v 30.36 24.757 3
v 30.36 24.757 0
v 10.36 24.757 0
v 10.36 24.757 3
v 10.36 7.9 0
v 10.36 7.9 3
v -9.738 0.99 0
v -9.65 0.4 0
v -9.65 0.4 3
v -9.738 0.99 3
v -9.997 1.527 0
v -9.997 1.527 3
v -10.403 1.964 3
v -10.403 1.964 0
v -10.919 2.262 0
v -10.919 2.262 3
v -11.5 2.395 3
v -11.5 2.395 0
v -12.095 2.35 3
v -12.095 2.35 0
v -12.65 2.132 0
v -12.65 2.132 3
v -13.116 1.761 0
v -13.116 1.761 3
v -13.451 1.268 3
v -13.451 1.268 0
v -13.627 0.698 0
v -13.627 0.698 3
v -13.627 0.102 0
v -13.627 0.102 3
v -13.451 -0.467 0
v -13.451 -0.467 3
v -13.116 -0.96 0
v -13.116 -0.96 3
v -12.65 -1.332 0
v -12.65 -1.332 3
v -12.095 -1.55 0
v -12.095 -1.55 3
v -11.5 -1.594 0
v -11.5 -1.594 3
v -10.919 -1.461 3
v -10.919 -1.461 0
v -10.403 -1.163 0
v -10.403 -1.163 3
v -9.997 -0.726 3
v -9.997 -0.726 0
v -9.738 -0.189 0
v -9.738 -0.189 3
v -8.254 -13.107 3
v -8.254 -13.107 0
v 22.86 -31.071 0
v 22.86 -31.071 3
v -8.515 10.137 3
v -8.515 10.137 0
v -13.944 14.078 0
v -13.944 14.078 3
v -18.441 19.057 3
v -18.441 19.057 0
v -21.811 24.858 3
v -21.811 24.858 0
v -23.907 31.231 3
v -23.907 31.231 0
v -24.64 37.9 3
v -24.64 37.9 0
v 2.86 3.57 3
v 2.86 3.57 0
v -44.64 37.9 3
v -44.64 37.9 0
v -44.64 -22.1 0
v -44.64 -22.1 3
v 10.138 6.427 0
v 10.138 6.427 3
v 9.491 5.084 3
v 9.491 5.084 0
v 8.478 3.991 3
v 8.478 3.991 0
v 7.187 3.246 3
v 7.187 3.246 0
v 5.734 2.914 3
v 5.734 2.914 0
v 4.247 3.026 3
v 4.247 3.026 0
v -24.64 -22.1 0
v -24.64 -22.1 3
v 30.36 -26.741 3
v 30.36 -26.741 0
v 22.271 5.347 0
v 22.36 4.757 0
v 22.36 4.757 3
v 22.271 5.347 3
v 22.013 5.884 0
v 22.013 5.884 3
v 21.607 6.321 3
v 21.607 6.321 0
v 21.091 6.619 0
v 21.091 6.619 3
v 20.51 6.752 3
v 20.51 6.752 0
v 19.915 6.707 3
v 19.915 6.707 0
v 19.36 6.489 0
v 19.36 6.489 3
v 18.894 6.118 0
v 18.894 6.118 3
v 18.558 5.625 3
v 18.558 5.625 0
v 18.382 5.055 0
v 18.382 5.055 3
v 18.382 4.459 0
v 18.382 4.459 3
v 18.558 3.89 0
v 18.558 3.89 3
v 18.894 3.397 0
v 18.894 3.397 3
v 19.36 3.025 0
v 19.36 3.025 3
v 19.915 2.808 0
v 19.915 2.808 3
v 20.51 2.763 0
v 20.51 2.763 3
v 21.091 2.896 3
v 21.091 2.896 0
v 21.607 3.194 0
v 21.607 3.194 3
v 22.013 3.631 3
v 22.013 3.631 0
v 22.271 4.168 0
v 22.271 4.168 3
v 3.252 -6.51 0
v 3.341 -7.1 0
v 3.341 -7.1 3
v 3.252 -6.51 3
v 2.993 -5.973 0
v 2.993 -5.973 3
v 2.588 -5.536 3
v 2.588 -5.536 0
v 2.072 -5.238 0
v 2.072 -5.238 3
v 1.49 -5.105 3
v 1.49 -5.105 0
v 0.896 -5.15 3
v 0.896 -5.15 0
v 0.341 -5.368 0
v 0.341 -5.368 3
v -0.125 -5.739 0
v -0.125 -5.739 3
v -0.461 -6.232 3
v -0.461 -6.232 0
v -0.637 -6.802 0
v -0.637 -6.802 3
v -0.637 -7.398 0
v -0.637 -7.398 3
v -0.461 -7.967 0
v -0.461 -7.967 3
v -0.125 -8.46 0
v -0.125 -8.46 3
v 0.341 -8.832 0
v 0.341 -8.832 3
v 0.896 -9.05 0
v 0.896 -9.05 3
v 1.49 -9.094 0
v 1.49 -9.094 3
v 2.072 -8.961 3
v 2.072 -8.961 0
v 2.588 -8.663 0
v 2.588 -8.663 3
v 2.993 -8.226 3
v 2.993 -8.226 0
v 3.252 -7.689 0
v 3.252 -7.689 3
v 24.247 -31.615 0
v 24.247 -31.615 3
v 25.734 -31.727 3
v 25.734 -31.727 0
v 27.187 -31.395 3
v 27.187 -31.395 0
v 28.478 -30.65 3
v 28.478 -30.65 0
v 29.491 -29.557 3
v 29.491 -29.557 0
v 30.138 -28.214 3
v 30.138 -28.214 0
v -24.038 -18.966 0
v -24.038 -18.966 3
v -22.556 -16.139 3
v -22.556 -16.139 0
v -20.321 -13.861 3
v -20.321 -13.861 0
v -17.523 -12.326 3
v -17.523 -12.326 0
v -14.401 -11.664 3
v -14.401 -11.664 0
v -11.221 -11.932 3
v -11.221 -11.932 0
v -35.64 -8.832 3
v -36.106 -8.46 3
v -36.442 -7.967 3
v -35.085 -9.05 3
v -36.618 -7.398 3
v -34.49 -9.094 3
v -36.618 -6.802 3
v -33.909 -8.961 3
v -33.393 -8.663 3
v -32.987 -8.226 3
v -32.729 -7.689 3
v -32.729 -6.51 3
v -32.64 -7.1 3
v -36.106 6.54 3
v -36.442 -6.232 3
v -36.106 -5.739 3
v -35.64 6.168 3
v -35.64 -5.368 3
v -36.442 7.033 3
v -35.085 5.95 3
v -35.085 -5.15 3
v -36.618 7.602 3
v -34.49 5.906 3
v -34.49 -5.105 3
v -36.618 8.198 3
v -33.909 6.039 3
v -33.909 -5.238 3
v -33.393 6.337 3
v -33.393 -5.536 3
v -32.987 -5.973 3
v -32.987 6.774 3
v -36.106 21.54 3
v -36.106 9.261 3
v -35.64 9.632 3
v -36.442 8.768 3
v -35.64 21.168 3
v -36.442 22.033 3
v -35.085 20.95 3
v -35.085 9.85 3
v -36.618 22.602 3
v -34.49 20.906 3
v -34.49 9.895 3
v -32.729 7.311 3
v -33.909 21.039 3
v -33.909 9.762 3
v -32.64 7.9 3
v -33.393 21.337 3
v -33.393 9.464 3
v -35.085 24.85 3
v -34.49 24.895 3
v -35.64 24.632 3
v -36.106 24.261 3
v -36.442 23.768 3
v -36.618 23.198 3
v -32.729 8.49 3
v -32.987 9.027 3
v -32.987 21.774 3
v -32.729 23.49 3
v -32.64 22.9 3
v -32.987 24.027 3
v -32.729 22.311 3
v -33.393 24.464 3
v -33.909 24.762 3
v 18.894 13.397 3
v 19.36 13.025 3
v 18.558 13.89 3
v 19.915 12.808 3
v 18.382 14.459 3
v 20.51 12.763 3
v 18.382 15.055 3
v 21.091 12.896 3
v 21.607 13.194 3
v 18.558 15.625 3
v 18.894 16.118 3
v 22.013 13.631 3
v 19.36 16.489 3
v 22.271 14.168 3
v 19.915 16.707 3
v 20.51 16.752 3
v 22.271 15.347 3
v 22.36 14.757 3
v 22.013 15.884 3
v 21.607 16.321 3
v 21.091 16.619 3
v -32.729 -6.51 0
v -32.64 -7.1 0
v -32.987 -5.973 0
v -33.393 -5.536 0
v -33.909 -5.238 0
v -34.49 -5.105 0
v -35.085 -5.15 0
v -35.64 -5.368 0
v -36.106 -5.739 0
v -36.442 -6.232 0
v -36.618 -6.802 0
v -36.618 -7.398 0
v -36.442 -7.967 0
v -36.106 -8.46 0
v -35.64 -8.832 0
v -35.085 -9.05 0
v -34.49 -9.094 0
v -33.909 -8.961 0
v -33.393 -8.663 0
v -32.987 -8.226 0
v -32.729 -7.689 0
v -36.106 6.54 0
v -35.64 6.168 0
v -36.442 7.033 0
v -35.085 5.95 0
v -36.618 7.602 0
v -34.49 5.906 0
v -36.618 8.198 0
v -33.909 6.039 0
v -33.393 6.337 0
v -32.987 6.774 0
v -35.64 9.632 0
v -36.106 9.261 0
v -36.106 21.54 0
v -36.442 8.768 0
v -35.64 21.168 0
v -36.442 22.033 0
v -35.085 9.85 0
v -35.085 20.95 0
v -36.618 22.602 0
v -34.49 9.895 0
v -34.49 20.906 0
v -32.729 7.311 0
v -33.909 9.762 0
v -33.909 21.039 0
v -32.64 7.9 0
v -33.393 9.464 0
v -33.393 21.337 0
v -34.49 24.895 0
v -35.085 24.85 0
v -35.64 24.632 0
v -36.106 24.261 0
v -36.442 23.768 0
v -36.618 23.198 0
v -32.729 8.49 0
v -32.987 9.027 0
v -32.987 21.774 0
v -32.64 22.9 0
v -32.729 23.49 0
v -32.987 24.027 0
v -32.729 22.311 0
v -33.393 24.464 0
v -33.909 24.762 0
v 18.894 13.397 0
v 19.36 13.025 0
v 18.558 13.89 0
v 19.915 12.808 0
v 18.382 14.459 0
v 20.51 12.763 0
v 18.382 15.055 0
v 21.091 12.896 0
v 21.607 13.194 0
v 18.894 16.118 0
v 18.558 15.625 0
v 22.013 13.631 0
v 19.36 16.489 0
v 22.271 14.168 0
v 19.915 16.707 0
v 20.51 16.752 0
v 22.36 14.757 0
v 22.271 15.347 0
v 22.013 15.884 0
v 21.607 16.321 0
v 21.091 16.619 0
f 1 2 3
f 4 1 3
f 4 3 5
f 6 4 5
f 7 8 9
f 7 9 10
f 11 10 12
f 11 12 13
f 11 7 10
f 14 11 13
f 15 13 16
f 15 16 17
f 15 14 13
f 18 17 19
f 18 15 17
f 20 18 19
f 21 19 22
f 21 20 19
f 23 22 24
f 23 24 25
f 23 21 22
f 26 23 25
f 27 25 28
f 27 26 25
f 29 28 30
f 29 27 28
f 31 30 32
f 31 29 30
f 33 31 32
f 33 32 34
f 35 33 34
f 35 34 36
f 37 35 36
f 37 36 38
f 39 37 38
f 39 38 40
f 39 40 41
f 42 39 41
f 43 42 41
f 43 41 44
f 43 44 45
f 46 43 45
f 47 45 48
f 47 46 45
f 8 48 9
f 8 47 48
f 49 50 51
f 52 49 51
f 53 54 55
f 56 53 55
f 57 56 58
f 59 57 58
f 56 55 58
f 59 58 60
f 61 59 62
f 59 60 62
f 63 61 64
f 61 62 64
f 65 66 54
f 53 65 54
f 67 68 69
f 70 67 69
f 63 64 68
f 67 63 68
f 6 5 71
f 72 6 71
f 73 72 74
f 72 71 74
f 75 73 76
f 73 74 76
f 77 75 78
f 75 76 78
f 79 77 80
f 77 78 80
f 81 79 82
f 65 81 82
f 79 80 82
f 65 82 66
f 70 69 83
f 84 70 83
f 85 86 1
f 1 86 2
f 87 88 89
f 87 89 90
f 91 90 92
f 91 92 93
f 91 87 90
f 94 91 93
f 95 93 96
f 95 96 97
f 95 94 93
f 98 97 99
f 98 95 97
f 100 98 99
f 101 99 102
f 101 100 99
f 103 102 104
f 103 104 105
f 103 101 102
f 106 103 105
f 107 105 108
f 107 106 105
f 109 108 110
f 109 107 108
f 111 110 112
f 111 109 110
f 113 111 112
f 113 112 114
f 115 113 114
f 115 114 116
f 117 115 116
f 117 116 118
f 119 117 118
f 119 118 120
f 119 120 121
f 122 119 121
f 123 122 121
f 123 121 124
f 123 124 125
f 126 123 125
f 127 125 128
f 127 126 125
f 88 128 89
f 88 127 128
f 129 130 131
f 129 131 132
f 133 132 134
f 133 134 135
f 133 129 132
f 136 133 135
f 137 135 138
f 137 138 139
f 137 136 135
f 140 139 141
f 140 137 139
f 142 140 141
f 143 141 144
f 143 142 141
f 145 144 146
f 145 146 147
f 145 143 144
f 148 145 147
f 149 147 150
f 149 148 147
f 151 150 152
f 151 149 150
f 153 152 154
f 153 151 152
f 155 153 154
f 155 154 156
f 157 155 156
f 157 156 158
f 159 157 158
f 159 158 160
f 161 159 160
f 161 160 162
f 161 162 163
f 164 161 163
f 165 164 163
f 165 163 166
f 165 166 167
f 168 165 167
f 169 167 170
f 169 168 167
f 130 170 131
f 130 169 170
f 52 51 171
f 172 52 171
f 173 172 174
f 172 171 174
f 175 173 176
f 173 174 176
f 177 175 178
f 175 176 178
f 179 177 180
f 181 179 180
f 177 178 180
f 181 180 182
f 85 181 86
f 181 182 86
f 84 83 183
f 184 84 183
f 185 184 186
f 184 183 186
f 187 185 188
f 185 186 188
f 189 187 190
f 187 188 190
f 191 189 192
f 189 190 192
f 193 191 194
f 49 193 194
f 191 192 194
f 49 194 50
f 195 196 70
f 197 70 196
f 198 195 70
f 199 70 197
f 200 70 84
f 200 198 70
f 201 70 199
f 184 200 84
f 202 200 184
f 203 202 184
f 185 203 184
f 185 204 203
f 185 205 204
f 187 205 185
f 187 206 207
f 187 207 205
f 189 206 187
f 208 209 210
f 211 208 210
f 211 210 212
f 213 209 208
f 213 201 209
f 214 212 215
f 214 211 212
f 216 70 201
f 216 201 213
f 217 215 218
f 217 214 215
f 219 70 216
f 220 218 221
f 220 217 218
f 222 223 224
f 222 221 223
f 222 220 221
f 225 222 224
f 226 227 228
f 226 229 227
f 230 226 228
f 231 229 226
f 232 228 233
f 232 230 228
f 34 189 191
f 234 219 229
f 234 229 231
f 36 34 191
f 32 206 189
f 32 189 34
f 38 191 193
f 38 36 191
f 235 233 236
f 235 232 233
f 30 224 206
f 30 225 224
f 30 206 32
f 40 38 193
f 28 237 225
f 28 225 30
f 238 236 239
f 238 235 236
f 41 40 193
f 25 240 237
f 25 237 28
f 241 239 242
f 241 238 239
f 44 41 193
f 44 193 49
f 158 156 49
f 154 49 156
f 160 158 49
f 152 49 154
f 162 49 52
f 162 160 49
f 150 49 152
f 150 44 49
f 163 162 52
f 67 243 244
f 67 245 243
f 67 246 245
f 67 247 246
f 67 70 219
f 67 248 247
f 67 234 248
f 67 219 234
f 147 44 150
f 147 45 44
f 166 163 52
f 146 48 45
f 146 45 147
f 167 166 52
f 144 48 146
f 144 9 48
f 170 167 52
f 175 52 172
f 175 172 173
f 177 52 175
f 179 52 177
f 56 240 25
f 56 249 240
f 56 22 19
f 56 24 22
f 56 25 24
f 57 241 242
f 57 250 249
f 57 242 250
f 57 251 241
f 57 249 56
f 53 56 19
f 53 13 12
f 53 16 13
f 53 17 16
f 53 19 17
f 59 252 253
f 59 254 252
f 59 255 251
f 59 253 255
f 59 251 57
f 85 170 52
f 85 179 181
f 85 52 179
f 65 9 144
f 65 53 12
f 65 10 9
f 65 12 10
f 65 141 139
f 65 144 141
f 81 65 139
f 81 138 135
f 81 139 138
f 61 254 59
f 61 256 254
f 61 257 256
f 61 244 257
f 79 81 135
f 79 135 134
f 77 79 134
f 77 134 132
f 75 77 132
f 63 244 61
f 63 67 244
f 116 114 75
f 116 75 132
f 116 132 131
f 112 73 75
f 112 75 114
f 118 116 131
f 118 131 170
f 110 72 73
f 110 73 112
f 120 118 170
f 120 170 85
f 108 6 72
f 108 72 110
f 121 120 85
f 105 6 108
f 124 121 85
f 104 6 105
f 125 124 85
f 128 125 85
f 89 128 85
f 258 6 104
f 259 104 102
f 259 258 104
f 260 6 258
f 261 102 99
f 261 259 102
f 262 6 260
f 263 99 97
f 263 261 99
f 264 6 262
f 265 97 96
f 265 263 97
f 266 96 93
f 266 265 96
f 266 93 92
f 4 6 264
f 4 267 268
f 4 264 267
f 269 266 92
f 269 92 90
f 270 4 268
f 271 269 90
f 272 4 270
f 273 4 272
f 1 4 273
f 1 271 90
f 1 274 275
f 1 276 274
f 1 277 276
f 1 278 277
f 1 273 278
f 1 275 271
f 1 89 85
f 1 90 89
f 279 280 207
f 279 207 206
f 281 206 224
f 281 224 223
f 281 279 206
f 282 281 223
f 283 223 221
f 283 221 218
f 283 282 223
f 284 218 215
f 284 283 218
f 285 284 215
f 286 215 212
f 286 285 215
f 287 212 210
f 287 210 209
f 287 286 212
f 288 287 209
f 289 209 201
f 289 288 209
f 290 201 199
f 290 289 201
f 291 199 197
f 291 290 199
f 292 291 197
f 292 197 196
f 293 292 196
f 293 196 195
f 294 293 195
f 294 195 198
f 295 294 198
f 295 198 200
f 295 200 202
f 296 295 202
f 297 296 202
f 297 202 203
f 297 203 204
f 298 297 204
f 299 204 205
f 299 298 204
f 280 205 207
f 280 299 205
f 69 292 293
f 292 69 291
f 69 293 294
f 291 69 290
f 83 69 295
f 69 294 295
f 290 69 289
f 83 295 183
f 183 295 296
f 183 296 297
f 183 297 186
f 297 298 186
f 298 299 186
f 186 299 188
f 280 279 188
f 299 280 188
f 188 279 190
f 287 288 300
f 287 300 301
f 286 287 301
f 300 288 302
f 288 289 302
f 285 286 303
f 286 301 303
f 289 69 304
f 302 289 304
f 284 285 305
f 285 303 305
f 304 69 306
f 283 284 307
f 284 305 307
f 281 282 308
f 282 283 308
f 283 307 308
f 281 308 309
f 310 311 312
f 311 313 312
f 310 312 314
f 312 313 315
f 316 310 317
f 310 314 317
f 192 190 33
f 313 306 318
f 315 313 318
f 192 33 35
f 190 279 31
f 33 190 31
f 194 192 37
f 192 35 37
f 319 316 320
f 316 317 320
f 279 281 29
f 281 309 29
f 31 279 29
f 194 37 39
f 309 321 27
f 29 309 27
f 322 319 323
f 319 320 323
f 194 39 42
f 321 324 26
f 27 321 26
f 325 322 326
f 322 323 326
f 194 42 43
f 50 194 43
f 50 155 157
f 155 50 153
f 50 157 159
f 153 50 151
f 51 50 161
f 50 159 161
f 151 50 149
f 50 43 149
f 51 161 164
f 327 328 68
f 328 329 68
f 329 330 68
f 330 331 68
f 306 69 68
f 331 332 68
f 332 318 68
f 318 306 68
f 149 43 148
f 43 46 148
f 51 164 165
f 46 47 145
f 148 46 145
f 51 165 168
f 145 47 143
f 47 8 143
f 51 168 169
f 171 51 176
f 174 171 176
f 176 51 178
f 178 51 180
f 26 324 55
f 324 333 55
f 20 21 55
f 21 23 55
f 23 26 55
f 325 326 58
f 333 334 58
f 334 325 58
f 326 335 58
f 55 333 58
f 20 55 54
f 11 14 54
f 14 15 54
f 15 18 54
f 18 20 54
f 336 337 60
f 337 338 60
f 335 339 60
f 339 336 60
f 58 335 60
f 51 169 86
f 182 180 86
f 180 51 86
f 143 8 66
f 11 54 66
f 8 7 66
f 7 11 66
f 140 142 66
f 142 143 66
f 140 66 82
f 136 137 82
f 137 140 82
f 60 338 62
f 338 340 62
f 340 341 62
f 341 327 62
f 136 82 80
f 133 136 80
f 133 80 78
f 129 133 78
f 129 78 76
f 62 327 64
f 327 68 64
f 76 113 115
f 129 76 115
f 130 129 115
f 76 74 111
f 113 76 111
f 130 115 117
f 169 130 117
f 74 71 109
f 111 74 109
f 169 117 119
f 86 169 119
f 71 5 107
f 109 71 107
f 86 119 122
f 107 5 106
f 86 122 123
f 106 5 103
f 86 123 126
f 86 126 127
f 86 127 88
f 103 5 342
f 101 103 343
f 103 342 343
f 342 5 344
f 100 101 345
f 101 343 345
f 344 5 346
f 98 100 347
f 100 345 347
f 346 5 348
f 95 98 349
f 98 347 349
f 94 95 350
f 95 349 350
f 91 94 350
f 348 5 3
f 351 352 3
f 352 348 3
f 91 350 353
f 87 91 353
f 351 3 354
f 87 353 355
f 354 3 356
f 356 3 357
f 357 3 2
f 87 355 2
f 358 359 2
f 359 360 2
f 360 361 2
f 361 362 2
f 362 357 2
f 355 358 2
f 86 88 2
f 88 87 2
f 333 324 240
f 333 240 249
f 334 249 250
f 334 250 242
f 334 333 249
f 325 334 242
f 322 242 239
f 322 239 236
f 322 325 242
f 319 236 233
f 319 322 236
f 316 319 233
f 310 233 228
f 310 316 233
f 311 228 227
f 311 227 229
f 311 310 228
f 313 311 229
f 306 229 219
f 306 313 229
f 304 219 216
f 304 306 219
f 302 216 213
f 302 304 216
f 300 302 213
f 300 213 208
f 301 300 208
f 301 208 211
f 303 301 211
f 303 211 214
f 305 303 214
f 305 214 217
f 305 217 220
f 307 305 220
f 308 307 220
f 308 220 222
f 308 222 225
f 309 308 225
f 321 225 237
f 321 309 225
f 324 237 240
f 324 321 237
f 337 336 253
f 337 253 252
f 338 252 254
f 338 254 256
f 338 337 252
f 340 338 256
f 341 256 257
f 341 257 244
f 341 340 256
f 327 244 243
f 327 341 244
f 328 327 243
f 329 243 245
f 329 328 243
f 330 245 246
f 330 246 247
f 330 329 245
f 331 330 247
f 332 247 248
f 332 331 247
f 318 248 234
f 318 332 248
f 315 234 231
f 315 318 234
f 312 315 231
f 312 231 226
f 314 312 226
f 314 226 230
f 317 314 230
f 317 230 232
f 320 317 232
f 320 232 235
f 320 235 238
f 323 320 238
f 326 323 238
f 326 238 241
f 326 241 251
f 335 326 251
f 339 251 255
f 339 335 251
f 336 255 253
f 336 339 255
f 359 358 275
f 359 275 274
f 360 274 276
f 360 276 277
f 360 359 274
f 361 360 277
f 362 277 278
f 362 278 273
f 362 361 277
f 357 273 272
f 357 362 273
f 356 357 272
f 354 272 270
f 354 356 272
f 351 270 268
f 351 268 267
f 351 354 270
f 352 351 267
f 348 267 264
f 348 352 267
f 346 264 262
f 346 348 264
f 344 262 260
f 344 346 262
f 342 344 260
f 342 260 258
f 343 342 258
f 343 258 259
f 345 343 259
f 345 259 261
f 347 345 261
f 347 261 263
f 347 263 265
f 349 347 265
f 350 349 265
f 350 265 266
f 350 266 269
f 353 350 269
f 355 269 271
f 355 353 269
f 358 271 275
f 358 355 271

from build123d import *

# Parameters (mm, degrees)
SKETCH_1_R      = 2
EXTRUDE_1_DEPTH = 3


with BuildPart() as part:
    # 草图1 → 凸台-拉伸1 (new body)
    with BuildSketch(Plane.XY):
        with BuildLine():
            Line((-8.253871793, -13.107166096), (22.860072418, -31.070810161))
            ThreePointArc((22.860072418, -31.070810161), (27.860072418, -31.070810161), (30.360072418, -26.740683142))
            Line((30.360072418, -26.740683142), (30.360072418, 24.757413889))
            Line((30.360072418, 24.757413889), (10.360072418, 24.757413889))
            Line((10.360072418, 24.757413889), (10.360072418, 7.900333009))
            ThreePointArc((10.360072418, 7.900333009), (7.860072418, 3.57020599), (2.860072418, 3.57020599))
            Line((2.860072418, 3.57020599), (-8.514722631, 10.137446974))
            ThreePointArc((-8.514722631, 10.137446974), (-20.277530658, 21.869741204), (-24.639927582, 37.900333009))
            Line((-24.639927582, 37.900333009), (-44.639927582, 37.900333009))
            Line((-44.639927582, 37.900333009), (-44.639927582, -22.099666991))
            Line((-44.639927582, -22.099666991), (-24.639927582, -22.099666991))
            ThreePointArc((-24.639927582, -22.099666991), (-18.978211718, -12.990882096), (-8.253871793, -13.107166096))
        make_face()
        with Locations((-34.639927582, 22.900333009)):
            Circle(SKETCH_1_R, mode=Mode.SUBTRACT)
        with Locations((-34.639927582, 7.900333009)):
            Circle(SKETCH_1_R, mode=Mode.SUBTRACT)
        with Locations((-34.639927582, -7.099666991)):
            Circle(SKETCH_1_R, mode=Mode.SUBTRACT)
        with Locations((-11.649546525, 0.400333009)):
            Circle(SKETCH_1_R, mode=Mode.SUBTRACT)
        with Locations((1.340834531, -7.099666991)):
            Circle(SKETCH_1_R, mode=Mode.SUBTRACT)
        with Locations((20.360072418, 4.757413889)):
            Circle(SKETCH_1_R, mode=Mode.SUBTRACT)
        with Locations((20.360072418, 14.757413889)):
            Circle(SKETCH_1_R, mode=Mode.SUBTRACT)
    extrude(amount=EXTRUDE_1_DEPTH)


solid = part.part
